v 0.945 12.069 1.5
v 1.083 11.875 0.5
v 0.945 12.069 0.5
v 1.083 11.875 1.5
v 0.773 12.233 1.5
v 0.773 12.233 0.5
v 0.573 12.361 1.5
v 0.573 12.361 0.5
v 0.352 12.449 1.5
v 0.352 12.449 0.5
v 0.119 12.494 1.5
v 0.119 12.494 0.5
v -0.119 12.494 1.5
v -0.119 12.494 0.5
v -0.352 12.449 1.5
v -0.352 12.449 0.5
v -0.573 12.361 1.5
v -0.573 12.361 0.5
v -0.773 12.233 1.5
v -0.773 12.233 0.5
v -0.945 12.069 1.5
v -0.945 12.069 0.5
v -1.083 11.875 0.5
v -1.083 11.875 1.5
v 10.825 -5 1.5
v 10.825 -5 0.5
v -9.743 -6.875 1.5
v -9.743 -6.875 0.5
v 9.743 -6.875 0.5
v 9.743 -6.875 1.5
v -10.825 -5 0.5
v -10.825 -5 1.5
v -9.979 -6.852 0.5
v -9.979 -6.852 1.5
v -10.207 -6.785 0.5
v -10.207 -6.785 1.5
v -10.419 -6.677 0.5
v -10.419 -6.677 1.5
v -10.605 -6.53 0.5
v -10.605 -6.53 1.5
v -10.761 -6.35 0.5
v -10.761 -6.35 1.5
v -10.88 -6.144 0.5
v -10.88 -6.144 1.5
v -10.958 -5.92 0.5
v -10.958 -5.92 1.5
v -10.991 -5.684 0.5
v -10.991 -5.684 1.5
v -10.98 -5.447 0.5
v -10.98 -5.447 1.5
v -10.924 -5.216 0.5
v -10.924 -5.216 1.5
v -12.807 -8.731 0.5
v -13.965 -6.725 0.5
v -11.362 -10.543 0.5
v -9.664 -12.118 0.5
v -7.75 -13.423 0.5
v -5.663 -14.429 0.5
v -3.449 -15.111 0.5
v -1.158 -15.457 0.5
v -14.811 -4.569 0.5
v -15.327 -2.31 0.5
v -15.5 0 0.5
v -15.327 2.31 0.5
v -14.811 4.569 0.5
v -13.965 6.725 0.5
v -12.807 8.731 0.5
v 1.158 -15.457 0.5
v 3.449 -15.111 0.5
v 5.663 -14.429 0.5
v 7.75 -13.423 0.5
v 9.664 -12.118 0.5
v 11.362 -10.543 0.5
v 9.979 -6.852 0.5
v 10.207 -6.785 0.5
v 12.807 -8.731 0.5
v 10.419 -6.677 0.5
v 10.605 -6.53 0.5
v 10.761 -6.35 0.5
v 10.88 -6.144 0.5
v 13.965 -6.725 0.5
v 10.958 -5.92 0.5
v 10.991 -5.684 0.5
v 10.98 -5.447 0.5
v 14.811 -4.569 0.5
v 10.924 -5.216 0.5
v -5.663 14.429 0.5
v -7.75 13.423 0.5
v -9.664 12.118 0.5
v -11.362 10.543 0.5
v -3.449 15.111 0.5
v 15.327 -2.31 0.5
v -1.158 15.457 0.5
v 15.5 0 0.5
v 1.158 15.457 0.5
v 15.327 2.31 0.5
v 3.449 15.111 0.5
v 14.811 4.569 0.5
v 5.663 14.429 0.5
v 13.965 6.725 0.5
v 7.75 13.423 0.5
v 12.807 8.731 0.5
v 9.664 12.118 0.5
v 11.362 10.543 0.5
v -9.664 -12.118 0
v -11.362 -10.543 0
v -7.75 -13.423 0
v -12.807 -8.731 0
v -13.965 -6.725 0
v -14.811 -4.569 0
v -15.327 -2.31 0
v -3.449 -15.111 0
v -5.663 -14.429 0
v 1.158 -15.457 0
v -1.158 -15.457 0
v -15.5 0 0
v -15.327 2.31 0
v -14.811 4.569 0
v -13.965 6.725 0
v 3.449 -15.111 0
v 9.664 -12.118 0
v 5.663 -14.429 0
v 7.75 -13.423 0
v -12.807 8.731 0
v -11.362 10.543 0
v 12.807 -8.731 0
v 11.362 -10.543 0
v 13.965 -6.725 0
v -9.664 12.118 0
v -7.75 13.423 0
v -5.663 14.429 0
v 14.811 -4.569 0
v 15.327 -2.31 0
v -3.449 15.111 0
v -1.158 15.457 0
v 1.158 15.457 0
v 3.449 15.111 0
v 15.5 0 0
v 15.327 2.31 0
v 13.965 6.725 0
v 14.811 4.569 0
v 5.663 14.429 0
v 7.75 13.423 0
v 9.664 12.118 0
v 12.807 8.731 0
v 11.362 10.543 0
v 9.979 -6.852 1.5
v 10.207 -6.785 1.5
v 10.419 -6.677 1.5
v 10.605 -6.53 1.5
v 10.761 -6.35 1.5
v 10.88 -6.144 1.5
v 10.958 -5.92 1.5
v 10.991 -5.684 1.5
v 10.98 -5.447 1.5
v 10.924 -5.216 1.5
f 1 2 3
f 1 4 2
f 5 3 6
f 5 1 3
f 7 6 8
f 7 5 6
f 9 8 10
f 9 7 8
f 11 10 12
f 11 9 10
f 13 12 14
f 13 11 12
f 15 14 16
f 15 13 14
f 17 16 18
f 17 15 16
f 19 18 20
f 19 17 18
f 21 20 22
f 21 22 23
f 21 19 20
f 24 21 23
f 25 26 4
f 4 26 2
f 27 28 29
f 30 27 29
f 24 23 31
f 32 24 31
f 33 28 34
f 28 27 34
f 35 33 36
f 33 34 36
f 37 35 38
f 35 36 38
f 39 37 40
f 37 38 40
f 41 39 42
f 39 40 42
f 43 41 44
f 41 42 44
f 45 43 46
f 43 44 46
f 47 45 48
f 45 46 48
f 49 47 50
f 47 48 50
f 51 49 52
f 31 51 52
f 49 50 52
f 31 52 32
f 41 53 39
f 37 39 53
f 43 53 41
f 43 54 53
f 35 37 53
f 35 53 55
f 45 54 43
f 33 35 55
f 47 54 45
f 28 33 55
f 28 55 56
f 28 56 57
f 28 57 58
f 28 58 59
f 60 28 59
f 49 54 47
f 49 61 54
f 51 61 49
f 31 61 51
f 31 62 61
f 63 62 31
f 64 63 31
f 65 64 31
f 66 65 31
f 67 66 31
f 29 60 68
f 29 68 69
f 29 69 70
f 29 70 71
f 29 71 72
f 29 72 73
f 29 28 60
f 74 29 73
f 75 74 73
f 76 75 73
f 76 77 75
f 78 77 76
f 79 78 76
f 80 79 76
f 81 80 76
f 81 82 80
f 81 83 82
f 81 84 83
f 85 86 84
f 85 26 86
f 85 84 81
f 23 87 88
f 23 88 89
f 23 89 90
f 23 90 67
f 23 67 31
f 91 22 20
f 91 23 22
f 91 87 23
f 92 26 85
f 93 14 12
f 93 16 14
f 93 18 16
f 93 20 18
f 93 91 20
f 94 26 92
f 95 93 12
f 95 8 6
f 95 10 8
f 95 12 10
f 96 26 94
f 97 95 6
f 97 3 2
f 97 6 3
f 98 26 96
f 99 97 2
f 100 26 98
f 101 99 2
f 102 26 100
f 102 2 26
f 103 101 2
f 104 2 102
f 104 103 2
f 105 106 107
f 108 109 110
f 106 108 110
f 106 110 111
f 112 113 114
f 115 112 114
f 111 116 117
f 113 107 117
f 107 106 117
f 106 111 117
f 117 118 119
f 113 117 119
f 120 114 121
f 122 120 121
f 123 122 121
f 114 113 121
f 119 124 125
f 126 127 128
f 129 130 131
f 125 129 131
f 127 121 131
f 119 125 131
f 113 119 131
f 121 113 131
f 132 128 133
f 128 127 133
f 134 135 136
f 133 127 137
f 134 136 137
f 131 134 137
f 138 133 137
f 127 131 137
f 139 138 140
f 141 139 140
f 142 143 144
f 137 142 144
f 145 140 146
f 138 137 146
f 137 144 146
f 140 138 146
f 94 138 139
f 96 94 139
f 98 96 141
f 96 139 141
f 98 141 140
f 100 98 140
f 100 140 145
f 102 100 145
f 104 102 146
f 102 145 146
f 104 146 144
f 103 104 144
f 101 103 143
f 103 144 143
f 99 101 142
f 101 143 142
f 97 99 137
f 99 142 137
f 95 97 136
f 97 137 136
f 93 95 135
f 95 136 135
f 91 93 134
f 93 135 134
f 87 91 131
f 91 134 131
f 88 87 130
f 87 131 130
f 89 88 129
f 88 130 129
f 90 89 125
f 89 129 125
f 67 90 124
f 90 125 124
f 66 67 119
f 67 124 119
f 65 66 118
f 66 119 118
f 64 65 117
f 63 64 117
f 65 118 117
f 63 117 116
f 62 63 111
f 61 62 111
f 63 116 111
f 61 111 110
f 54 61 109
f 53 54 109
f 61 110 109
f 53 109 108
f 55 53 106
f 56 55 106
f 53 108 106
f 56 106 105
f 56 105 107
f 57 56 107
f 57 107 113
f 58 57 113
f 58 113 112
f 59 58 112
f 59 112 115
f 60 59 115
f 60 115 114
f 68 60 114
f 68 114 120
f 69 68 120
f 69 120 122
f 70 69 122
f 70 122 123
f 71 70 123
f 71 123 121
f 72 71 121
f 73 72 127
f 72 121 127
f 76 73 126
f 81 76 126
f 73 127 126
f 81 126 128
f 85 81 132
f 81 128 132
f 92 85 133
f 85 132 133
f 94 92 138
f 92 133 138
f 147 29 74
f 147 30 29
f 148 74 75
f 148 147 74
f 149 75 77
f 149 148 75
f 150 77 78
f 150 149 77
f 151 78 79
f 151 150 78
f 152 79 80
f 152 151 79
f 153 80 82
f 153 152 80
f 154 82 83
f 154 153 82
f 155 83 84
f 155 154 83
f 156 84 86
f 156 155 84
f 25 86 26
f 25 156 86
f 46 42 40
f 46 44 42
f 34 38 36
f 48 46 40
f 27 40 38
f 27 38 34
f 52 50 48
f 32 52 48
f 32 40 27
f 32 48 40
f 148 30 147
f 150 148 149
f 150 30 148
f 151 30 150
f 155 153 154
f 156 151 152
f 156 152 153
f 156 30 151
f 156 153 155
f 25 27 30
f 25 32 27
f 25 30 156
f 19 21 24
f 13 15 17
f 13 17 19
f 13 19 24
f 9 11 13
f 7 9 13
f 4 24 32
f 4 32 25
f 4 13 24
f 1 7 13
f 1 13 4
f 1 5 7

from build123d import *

# Parameters (mm, degrees)
SKETCH1_R           = 15.5
BOSS_EXTRUDE1_DEPTH = 0.5
BOSS_EXTRUDE2_DEPTH = 1
FILLET1_R           = 1.25


with BuildPart() as part:
    # Sketch1 → Boss-Extrude1 (new body)
    with BuildSketch(Plane.XY):
        Circle(SKETCH1_R)
    extrude(amount=BOSS_EXTRUDE1_DEPTH)

    # Sketch2 → Boss-Extrude2 (add)
    with BuildSketch(Plane.XY.offset(0.5)):
        Polygon((-11.907849302, -6.875), (11.907849302, -6.875), (0, 13.75), align=None)
    extrude(amount=BOSS_EXTRUDE2_DEPTH)

    # Fillet1
    fillet1_edges = [part.edges().sort_by_distance(p)[0] for p in [
        (0, 13.75, 1),
        (-11.907849302, -6.875, 1),
        (11.907849302, -6.875, 1),
    ]]
    fillet(fillet1_edges, radius=FILLET1_R)


solid = part.part
